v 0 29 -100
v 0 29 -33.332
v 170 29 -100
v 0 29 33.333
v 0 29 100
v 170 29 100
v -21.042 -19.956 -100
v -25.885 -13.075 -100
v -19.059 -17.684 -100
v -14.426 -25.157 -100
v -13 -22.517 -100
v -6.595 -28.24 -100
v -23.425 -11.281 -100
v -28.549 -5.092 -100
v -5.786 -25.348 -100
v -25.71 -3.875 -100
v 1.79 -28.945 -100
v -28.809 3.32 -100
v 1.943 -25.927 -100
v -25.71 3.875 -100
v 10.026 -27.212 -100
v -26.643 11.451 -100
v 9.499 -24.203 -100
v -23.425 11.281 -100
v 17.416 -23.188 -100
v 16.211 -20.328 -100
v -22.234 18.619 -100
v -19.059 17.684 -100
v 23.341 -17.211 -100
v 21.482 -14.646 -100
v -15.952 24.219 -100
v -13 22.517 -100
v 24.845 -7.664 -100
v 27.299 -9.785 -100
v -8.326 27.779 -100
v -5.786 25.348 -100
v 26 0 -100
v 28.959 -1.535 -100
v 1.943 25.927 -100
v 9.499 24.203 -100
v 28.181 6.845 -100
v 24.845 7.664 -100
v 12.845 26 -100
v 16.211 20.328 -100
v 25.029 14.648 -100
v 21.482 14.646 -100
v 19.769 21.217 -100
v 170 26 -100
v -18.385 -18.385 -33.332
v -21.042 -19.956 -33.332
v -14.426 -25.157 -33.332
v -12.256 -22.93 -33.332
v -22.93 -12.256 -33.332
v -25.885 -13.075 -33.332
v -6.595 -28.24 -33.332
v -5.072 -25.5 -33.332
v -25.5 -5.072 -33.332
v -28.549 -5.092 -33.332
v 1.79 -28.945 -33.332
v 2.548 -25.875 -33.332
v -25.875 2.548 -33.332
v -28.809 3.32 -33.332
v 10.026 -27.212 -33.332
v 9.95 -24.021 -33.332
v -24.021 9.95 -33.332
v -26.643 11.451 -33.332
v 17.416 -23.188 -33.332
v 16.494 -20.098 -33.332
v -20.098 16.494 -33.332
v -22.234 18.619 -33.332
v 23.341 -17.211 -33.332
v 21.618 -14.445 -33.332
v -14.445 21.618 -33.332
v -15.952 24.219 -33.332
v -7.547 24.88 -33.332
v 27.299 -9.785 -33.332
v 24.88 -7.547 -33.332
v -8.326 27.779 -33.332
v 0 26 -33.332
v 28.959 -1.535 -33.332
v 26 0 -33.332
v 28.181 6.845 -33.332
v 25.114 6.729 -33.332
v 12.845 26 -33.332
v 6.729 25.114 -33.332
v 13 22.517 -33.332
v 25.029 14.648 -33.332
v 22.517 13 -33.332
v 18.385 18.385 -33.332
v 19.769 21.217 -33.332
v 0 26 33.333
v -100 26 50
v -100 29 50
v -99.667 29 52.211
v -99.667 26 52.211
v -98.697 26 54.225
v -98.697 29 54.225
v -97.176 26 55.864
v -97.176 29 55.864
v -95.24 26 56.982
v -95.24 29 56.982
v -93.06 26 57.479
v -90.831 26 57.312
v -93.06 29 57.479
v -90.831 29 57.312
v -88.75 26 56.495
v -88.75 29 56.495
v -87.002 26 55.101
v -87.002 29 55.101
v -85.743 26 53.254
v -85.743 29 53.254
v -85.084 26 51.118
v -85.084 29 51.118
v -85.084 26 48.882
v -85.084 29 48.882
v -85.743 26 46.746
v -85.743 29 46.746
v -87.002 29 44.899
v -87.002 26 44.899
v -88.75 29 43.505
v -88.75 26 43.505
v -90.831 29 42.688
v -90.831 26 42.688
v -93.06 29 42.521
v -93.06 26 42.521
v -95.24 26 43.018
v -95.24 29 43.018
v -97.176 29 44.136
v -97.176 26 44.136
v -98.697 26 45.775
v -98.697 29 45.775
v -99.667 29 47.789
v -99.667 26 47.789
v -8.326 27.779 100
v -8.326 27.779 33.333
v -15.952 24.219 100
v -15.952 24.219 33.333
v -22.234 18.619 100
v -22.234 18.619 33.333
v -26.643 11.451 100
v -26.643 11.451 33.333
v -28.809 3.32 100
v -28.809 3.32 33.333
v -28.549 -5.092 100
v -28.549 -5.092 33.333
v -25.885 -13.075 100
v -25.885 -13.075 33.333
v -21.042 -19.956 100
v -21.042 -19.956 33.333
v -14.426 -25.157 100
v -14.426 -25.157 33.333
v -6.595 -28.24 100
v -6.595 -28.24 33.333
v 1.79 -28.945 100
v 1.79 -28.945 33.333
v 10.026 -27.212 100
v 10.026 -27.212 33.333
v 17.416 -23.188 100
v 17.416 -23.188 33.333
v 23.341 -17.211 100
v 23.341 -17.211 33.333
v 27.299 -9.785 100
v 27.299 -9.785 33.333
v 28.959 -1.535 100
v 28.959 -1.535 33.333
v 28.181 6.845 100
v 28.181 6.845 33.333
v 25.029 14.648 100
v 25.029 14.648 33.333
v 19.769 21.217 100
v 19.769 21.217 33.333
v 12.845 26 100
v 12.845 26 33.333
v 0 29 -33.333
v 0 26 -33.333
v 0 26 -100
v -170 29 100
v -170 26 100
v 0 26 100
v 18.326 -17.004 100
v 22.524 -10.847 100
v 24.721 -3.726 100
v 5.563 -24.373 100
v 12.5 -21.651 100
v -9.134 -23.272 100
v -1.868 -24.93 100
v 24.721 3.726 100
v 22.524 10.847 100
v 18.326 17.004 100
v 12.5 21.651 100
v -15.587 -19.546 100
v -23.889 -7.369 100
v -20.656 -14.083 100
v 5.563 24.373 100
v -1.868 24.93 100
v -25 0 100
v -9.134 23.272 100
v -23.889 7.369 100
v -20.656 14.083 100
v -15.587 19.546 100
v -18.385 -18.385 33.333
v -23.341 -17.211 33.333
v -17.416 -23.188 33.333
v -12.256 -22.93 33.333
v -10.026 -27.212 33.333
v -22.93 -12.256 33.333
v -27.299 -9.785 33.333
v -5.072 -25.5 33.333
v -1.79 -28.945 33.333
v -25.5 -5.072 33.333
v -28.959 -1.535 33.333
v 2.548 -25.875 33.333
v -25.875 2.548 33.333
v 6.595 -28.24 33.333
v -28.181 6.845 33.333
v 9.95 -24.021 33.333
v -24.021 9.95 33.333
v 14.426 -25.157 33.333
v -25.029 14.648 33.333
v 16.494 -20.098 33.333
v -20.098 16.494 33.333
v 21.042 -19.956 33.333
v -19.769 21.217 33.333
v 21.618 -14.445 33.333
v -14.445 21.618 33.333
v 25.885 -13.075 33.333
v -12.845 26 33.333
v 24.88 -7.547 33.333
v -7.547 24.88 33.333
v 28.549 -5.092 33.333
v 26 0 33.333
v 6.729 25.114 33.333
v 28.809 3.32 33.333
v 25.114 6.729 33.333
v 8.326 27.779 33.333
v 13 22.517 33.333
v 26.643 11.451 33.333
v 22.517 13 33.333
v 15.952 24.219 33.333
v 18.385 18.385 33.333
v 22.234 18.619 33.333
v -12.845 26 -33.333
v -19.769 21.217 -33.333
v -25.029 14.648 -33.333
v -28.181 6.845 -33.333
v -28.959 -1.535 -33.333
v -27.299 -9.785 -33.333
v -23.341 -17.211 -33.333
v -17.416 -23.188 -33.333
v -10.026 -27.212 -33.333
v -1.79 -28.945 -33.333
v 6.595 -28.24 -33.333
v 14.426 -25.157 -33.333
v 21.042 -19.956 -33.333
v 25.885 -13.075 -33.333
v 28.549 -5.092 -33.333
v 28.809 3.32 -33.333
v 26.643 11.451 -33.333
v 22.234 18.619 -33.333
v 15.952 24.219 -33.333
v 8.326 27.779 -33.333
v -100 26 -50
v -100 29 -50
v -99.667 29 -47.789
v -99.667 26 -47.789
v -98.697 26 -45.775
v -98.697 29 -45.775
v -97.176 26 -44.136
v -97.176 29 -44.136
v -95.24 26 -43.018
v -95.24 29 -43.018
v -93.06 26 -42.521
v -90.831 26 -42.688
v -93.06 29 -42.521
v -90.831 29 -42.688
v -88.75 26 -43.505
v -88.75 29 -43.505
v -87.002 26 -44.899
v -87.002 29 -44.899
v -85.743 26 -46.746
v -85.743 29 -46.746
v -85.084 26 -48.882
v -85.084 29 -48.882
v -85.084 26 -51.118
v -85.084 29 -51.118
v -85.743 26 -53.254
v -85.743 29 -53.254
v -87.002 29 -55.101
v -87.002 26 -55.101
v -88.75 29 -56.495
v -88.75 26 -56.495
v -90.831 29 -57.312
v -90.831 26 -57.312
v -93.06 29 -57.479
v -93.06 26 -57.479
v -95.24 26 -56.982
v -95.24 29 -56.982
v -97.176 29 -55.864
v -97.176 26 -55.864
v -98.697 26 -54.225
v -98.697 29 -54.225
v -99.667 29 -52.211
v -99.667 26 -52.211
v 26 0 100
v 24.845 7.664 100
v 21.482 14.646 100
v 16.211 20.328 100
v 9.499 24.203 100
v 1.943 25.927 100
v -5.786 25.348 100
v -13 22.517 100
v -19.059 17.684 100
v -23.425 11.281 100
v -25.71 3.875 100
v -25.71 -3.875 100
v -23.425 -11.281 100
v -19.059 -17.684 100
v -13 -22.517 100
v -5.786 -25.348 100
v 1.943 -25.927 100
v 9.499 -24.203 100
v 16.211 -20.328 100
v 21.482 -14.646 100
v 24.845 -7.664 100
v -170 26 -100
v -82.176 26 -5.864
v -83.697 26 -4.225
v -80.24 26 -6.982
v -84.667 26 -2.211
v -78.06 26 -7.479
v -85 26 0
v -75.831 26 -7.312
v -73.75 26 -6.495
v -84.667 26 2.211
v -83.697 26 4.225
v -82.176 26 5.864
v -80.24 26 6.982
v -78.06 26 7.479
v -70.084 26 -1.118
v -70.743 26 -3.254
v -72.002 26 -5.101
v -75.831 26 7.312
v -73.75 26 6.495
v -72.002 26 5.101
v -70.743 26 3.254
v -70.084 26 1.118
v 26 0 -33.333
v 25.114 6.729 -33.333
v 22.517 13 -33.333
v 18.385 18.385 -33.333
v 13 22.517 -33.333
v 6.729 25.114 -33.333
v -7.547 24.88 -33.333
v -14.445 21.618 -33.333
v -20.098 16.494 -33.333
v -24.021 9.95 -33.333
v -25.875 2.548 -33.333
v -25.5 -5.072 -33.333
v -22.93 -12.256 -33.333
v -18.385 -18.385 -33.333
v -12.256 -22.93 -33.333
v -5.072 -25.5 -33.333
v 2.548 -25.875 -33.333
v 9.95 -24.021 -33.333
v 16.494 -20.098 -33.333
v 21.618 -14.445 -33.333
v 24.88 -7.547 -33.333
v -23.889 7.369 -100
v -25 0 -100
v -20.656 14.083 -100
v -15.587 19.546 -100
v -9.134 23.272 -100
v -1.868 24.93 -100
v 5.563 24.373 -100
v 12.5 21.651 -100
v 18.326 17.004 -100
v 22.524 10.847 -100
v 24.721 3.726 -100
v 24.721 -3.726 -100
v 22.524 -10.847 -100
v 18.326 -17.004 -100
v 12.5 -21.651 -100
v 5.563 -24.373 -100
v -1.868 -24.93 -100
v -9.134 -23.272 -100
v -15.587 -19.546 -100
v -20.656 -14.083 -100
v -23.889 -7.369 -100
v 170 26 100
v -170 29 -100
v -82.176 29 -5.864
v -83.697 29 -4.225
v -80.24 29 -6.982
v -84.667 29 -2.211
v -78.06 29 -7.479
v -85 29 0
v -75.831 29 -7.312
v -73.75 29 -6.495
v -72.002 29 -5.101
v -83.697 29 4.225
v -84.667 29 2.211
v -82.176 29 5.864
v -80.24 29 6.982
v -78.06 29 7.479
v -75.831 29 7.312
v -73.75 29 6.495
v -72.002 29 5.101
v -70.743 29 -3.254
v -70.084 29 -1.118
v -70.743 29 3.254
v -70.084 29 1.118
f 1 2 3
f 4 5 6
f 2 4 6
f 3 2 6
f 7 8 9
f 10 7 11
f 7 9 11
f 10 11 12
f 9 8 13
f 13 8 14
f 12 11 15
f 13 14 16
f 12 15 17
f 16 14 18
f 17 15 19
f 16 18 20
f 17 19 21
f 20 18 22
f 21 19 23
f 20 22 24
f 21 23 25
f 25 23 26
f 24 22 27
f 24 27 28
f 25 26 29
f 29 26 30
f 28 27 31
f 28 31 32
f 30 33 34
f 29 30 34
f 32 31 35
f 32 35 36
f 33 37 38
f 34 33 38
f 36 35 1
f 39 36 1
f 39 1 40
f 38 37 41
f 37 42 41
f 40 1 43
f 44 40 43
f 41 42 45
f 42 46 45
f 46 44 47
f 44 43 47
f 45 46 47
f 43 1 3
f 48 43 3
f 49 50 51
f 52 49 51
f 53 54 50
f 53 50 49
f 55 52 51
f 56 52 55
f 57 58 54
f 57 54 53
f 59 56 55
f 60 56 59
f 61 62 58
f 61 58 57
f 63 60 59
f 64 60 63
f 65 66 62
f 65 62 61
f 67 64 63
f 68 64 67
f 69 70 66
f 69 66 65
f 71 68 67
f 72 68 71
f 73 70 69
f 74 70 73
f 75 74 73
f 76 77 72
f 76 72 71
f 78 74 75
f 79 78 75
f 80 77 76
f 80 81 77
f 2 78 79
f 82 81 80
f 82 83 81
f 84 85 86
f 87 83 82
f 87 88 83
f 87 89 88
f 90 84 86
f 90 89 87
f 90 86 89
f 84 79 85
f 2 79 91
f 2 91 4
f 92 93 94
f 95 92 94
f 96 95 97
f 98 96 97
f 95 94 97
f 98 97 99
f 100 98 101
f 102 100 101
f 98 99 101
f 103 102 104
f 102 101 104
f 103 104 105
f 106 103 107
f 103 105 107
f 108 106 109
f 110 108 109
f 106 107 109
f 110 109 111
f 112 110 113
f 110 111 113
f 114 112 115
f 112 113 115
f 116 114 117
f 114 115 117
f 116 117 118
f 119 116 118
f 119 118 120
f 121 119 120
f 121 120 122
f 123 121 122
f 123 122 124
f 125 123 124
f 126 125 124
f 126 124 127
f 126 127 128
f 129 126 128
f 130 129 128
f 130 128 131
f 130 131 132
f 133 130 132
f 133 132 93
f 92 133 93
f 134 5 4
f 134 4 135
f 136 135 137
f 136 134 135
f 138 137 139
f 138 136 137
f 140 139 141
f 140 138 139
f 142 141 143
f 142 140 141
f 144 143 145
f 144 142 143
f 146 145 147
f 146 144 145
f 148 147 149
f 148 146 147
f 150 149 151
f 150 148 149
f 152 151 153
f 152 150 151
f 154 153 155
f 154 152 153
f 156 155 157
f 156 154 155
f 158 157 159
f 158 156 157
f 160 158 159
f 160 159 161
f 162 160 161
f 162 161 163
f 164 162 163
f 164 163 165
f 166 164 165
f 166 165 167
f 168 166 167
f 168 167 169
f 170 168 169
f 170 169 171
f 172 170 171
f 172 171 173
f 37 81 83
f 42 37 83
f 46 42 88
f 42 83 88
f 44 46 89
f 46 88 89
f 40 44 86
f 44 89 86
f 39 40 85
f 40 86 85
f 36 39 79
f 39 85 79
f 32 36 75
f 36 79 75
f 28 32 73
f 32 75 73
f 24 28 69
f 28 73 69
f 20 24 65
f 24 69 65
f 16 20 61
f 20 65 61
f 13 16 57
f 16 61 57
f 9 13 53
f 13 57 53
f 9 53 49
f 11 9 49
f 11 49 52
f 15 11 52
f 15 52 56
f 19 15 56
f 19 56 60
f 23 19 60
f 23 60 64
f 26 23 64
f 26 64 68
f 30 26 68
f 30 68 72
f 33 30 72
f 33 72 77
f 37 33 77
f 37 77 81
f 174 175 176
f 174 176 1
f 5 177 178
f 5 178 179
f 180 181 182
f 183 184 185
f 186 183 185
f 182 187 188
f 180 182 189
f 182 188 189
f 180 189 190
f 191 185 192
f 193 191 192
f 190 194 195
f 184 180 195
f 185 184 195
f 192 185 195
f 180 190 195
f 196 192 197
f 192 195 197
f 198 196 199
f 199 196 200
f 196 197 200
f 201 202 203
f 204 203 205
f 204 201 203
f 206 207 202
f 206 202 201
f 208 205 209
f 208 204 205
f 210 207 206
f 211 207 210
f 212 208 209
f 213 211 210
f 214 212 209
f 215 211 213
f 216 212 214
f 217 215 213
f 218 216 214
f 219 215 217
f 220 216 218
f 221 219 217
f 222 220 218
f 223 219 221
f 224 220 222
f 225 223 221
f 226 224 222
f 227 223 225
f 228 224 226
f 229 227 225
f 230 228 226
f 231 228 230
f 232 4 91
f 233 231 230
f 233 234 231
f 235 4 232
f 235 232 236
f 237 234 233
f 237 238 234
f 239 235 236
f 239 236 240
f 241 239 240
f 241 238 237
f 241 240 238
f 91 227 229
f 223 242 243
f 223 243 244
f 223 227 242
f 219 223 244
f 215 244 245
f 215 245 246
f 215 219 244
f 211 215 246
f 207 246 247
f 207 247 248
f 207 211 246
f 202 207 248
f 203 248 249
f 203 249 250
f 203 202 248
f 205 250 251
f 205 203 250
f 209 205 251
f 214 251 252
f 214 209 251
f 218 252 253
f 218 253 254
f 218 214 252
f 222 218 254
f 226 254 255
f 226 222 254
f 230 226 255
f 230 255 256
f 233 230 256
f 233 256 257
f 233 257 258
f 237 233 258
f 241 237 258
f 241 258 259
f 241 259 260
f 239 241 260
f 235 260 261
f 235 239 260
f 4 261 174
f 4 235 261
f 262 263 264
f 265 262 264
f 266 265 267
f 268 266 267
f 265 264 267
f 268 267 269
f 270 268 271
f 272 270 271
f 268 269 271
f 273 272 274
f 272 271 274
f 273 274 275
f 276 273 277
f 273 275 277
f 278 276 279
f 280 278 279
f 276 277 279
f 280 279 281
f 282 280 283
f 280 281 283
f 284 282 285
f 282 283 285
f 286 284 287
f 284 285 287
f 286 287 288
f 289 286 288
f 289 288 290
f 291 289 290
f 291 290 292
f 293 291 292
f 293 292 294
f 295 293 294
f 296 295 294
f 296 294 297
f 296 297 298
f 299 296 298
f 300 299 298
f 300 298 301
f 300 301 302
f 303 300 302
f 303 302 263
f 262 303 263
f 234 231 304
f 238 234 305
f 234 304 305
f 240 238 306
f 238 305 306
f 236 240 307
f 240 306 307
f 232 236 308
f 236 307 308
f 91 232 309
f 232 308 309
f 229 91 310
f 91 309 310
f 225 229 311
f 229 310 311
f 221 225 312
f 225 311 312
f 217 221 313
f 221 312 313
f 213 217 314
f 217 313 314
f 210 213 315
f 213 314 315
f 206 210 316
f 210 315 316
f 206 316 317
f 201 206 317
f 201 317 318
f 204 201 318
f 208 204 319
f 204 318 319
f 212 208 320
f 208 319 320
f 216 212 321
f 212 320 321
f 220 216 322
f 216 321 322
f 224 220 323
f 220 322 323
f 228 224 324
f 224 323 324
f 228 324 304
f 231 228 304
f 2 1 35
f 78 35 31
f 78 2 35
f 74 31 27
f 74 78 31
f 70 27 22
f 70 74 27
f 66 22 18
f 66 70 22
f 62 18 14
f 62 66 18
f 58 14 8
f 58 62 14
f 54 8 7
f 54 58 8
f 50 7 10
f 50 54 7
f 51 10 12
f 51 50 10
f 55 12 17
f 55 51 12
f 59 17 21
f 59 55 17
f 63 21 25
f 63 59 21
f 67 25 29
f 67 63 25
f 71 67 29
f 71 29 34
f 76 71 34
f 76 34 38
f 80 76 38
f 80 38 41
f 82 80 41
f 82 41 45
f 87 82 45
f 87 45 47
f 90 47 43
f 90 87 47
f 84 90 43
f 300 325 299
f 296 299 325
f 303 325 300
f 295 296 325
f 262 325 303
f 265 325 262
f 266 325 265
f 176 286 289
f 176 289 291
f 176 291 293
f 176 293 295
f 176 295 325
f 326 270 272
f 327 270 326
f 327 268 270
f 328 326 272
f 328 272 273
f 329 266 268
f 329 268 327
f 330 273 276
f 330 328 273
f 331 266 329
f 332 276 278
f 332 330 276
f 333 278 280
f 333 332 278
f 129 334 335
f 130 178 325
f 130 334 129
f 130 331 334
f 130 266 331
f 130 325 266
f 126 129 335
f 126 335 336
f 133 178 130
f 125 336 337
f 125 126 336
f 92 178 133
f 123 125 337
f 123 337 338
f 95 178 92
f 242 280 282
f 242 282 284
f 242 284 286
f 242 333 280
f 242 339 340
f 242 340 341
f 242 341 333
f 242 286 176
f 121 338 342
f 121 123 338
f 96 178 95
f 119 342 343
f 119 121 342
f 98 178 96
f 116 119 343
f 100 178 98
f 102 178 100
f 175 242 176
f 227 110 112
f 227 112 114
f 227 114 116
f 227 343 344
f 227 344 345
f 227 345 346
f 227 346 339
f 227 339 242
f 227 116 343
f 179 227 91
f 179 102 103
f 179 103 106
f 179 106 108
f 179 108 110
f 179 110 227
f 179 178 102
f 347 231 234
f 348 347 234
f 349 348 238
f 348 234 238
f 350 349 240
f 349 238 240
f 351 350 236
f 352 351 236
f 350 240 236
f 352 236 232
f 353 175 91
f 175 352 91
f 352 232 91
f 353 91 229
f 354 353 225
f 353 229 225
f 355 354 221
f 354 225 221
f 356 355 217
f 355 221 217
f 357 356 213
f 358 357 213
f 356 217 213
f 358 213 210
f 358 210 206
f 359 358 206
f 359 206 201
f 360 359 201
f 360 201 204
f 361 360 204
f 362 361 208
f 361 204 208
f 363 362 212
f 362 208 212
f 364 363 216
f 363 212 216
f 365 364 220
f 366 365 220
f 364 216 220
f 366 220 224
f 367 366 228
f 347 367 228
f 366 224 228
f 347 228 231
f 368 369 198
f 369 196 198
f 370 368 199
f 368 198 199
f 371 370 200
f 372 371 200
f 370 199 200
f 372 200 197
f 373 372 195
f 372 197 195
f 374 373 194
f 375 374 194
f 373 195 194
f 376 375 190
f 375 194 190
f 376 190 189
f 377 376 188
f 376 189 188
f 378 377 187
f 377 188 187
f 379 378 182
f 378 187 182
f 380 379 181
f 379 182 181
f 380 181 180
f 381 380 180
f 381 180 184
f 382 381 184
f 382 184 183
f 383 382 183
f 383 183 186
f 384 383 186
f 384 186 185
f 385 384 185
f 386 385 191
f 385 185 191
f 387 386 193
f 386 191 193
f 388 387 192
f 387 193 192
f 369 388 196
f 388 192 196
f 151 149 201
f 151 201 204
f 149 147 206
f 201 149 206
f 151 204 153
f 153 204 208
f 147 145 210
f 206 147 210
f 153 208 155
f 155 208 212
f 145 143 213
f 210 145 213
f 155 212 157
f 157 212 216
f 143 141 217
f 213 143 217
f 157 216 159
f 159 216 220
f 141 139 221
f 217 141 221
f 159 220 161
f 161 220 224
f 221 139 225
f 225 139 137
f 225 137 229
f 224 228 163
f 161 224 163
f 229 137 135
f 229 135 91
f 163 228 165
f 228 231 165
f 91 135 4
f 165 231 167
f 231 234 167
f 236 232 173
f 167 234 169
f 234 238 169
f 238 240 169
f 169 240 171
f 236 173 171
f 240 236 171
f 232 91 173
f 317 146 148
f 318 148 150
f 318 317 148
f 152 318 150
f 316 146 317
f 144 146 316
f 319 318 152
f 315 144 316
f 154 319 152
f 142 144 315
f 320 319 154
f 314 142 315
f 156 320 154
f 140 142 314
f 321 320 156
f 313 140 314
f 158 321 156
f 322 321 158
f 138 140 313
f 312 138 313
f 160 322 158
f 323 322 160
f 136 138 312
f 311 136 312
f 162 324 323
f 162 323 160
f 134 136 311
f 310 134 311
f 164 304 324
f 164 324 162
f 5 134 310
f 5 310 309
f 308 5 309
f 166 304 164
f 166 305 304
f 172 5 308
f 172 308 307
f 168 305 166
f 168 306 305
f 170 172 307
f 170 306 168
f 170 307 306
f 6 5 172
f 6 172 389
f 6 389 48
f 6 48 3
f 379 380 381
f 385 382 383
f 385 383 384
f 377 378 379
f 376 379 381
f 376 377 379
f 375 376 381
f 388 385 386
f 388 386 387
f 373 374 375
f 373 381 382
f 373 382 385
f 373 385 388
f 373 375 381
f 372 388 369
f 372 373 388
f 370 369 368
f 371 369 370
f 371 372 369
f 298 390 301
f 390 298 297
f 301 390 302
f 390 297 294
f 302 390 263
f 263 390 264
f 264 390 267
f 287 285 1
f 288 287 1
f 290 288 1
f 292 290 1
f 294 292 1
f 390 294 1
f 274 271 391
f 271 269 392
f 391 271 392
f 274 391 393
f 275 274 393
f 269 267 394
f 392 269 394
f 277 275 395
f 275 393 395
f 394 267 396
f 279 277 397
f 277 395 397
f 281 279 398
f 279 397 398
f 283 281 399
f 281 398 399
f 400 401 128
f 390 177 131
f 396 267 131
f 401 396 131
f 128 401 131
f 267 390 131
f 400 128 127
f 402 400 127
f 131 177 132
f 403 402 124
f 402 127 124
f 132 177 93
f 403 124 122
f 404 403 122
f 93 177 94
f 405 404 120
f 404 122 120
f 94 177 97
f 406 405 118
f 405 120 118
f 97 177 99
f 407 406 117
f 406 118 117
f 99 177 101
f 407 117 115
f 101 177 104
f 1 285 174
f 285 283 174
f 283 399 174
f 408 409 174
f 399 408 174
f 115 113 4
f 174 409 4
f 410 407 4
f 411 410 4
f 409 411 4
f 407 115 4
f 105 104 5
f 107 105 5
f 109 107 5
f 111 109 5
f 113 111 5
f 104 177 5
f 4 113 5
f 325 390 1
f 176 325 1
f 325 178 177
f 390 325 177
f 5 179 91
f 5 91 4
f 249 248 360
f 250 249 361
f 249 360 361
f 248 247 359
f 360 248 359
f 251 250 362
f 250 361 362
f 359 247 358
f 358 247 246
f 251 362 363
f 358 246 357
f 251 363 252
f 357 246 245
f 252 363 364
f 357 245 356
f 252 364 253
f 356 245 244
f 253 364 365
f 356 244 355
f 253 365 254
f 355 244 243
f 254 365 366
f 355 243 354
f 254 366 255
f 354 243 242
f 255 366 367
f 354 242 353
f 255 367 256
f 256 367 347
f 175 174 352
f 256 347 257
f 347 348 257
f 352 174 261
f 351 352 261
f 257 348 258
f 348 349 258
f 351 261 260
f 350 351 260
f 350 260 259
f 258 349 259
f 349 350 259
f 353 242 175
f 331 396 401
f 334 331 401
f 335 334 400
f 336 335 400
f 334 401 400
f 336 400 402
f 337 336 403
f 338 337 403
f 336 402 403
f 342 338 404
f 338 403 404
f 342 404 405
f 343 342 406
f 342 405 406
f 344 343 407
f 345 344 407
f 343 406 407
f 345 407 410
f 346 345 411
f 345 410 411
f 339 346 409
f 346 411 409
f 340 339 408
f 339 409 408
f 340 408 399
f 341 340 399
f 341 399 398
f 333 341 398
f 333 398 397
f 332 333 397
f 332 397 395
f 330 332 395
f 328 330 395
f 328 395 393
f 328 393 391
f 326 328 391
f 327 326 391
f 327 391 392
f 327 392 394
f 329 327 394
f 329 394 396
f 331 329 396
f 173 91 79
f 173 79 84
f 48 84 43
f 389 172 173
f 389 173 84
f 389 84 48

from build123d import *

# Parameters (mm, degrees)
F1_W      = 25
F1_H      = 200
F3_R      = 29
F3_R_2    = 26
F4_DEPTH  = 66.6666666667
F5_START  = -133.332
F5_DEPTH  = 66.668
F6_START  = -66.6666666667
F6_DEPTH  = 66.6666666667
F7_W      = 170
F7_H      = 3
F8_DEPTH  = 200
F9_W      = 170
F9_H      = 3
F10_DEPTH = 200
F11_R     = 7.5
F12_DEPTH = 25


with BuildPart() as f2:
    # F1 (on Front) → F2 (revolve)
    with BuildSketch(Plane.XZ):
        with Locations((-12.5, 0)):
            Rectangle(F1_W, F1_H)
    revolve(axis=Axis((0, 0, 0), (0, 0, -1)))


with BuildPart() as f4:
    # F3 (on face) → F4 (new body)
    with BuildSketch(Plane.XY.offset(100)):
        Circle(F3_R)
        Circle(F3_R_2, mode=Mode.SUBTRACT)
    extrude(amount=-F4_DEPTH)



with BuildPart() as f5:
    # F3 (on face) → F5 (new body)
    with BuildSketch(Plane.XY.offset(100).offset(F5_START)):
        Circle(F3_R)
        Circle(F3_R_2, mode=Mode.SUBTRACT)
    extrude(amount=-F5_DEPTH)


with BuildPart() as f6:
    # F3 (on face) → F6 (new body)
    with BuildSketch(Plane.XY.offset(100).offset(F6_START)):
        Circle(F3_R)
        Circle(F3_R_2, mode=Mode.SUBTRACT)
    extrude(amount=-F6_DEPTH)

    # F9 (on face) → F10 (join)
    with BuildSketch(Plane.XY.offset(100)):
        with Locations((-85, 27.5)):
            Rectangle(F9_W, F9_H)
    extrude(amount=-F10_DEPTH)

    # F11 (on face) → F12 (cut)
    with BuildSketch(Plane(origin=(0, 29, 0), x_dir=(-1, 0, 0), z_dir=(0, 1, 0))):
        with Locations((77.5, 0)):
            Circle(F11_R)
        with Locations((92.5, 50)):
            Circle(F11_R)
        with Locations((92.5, -50)):
            Circle(F11_R)
    extrude(amount=-F12_DEPTH, mode=Mode.SUBTRACT)


with BuildPart() as f4_1:
    add(f4.part)

    add(f5.part)  # F8 merges F5
    # F7 (on face) → F8 (join)
    with BuildSketch(Plane.XY.offset(100)):
        with Locations((85, 27.5)):
            Rectangle(F7_W, F7_H)
    extrude(amount=-F8_DEPTH)


solid = Compound([f2.part, f6.part, f4_1.part])
